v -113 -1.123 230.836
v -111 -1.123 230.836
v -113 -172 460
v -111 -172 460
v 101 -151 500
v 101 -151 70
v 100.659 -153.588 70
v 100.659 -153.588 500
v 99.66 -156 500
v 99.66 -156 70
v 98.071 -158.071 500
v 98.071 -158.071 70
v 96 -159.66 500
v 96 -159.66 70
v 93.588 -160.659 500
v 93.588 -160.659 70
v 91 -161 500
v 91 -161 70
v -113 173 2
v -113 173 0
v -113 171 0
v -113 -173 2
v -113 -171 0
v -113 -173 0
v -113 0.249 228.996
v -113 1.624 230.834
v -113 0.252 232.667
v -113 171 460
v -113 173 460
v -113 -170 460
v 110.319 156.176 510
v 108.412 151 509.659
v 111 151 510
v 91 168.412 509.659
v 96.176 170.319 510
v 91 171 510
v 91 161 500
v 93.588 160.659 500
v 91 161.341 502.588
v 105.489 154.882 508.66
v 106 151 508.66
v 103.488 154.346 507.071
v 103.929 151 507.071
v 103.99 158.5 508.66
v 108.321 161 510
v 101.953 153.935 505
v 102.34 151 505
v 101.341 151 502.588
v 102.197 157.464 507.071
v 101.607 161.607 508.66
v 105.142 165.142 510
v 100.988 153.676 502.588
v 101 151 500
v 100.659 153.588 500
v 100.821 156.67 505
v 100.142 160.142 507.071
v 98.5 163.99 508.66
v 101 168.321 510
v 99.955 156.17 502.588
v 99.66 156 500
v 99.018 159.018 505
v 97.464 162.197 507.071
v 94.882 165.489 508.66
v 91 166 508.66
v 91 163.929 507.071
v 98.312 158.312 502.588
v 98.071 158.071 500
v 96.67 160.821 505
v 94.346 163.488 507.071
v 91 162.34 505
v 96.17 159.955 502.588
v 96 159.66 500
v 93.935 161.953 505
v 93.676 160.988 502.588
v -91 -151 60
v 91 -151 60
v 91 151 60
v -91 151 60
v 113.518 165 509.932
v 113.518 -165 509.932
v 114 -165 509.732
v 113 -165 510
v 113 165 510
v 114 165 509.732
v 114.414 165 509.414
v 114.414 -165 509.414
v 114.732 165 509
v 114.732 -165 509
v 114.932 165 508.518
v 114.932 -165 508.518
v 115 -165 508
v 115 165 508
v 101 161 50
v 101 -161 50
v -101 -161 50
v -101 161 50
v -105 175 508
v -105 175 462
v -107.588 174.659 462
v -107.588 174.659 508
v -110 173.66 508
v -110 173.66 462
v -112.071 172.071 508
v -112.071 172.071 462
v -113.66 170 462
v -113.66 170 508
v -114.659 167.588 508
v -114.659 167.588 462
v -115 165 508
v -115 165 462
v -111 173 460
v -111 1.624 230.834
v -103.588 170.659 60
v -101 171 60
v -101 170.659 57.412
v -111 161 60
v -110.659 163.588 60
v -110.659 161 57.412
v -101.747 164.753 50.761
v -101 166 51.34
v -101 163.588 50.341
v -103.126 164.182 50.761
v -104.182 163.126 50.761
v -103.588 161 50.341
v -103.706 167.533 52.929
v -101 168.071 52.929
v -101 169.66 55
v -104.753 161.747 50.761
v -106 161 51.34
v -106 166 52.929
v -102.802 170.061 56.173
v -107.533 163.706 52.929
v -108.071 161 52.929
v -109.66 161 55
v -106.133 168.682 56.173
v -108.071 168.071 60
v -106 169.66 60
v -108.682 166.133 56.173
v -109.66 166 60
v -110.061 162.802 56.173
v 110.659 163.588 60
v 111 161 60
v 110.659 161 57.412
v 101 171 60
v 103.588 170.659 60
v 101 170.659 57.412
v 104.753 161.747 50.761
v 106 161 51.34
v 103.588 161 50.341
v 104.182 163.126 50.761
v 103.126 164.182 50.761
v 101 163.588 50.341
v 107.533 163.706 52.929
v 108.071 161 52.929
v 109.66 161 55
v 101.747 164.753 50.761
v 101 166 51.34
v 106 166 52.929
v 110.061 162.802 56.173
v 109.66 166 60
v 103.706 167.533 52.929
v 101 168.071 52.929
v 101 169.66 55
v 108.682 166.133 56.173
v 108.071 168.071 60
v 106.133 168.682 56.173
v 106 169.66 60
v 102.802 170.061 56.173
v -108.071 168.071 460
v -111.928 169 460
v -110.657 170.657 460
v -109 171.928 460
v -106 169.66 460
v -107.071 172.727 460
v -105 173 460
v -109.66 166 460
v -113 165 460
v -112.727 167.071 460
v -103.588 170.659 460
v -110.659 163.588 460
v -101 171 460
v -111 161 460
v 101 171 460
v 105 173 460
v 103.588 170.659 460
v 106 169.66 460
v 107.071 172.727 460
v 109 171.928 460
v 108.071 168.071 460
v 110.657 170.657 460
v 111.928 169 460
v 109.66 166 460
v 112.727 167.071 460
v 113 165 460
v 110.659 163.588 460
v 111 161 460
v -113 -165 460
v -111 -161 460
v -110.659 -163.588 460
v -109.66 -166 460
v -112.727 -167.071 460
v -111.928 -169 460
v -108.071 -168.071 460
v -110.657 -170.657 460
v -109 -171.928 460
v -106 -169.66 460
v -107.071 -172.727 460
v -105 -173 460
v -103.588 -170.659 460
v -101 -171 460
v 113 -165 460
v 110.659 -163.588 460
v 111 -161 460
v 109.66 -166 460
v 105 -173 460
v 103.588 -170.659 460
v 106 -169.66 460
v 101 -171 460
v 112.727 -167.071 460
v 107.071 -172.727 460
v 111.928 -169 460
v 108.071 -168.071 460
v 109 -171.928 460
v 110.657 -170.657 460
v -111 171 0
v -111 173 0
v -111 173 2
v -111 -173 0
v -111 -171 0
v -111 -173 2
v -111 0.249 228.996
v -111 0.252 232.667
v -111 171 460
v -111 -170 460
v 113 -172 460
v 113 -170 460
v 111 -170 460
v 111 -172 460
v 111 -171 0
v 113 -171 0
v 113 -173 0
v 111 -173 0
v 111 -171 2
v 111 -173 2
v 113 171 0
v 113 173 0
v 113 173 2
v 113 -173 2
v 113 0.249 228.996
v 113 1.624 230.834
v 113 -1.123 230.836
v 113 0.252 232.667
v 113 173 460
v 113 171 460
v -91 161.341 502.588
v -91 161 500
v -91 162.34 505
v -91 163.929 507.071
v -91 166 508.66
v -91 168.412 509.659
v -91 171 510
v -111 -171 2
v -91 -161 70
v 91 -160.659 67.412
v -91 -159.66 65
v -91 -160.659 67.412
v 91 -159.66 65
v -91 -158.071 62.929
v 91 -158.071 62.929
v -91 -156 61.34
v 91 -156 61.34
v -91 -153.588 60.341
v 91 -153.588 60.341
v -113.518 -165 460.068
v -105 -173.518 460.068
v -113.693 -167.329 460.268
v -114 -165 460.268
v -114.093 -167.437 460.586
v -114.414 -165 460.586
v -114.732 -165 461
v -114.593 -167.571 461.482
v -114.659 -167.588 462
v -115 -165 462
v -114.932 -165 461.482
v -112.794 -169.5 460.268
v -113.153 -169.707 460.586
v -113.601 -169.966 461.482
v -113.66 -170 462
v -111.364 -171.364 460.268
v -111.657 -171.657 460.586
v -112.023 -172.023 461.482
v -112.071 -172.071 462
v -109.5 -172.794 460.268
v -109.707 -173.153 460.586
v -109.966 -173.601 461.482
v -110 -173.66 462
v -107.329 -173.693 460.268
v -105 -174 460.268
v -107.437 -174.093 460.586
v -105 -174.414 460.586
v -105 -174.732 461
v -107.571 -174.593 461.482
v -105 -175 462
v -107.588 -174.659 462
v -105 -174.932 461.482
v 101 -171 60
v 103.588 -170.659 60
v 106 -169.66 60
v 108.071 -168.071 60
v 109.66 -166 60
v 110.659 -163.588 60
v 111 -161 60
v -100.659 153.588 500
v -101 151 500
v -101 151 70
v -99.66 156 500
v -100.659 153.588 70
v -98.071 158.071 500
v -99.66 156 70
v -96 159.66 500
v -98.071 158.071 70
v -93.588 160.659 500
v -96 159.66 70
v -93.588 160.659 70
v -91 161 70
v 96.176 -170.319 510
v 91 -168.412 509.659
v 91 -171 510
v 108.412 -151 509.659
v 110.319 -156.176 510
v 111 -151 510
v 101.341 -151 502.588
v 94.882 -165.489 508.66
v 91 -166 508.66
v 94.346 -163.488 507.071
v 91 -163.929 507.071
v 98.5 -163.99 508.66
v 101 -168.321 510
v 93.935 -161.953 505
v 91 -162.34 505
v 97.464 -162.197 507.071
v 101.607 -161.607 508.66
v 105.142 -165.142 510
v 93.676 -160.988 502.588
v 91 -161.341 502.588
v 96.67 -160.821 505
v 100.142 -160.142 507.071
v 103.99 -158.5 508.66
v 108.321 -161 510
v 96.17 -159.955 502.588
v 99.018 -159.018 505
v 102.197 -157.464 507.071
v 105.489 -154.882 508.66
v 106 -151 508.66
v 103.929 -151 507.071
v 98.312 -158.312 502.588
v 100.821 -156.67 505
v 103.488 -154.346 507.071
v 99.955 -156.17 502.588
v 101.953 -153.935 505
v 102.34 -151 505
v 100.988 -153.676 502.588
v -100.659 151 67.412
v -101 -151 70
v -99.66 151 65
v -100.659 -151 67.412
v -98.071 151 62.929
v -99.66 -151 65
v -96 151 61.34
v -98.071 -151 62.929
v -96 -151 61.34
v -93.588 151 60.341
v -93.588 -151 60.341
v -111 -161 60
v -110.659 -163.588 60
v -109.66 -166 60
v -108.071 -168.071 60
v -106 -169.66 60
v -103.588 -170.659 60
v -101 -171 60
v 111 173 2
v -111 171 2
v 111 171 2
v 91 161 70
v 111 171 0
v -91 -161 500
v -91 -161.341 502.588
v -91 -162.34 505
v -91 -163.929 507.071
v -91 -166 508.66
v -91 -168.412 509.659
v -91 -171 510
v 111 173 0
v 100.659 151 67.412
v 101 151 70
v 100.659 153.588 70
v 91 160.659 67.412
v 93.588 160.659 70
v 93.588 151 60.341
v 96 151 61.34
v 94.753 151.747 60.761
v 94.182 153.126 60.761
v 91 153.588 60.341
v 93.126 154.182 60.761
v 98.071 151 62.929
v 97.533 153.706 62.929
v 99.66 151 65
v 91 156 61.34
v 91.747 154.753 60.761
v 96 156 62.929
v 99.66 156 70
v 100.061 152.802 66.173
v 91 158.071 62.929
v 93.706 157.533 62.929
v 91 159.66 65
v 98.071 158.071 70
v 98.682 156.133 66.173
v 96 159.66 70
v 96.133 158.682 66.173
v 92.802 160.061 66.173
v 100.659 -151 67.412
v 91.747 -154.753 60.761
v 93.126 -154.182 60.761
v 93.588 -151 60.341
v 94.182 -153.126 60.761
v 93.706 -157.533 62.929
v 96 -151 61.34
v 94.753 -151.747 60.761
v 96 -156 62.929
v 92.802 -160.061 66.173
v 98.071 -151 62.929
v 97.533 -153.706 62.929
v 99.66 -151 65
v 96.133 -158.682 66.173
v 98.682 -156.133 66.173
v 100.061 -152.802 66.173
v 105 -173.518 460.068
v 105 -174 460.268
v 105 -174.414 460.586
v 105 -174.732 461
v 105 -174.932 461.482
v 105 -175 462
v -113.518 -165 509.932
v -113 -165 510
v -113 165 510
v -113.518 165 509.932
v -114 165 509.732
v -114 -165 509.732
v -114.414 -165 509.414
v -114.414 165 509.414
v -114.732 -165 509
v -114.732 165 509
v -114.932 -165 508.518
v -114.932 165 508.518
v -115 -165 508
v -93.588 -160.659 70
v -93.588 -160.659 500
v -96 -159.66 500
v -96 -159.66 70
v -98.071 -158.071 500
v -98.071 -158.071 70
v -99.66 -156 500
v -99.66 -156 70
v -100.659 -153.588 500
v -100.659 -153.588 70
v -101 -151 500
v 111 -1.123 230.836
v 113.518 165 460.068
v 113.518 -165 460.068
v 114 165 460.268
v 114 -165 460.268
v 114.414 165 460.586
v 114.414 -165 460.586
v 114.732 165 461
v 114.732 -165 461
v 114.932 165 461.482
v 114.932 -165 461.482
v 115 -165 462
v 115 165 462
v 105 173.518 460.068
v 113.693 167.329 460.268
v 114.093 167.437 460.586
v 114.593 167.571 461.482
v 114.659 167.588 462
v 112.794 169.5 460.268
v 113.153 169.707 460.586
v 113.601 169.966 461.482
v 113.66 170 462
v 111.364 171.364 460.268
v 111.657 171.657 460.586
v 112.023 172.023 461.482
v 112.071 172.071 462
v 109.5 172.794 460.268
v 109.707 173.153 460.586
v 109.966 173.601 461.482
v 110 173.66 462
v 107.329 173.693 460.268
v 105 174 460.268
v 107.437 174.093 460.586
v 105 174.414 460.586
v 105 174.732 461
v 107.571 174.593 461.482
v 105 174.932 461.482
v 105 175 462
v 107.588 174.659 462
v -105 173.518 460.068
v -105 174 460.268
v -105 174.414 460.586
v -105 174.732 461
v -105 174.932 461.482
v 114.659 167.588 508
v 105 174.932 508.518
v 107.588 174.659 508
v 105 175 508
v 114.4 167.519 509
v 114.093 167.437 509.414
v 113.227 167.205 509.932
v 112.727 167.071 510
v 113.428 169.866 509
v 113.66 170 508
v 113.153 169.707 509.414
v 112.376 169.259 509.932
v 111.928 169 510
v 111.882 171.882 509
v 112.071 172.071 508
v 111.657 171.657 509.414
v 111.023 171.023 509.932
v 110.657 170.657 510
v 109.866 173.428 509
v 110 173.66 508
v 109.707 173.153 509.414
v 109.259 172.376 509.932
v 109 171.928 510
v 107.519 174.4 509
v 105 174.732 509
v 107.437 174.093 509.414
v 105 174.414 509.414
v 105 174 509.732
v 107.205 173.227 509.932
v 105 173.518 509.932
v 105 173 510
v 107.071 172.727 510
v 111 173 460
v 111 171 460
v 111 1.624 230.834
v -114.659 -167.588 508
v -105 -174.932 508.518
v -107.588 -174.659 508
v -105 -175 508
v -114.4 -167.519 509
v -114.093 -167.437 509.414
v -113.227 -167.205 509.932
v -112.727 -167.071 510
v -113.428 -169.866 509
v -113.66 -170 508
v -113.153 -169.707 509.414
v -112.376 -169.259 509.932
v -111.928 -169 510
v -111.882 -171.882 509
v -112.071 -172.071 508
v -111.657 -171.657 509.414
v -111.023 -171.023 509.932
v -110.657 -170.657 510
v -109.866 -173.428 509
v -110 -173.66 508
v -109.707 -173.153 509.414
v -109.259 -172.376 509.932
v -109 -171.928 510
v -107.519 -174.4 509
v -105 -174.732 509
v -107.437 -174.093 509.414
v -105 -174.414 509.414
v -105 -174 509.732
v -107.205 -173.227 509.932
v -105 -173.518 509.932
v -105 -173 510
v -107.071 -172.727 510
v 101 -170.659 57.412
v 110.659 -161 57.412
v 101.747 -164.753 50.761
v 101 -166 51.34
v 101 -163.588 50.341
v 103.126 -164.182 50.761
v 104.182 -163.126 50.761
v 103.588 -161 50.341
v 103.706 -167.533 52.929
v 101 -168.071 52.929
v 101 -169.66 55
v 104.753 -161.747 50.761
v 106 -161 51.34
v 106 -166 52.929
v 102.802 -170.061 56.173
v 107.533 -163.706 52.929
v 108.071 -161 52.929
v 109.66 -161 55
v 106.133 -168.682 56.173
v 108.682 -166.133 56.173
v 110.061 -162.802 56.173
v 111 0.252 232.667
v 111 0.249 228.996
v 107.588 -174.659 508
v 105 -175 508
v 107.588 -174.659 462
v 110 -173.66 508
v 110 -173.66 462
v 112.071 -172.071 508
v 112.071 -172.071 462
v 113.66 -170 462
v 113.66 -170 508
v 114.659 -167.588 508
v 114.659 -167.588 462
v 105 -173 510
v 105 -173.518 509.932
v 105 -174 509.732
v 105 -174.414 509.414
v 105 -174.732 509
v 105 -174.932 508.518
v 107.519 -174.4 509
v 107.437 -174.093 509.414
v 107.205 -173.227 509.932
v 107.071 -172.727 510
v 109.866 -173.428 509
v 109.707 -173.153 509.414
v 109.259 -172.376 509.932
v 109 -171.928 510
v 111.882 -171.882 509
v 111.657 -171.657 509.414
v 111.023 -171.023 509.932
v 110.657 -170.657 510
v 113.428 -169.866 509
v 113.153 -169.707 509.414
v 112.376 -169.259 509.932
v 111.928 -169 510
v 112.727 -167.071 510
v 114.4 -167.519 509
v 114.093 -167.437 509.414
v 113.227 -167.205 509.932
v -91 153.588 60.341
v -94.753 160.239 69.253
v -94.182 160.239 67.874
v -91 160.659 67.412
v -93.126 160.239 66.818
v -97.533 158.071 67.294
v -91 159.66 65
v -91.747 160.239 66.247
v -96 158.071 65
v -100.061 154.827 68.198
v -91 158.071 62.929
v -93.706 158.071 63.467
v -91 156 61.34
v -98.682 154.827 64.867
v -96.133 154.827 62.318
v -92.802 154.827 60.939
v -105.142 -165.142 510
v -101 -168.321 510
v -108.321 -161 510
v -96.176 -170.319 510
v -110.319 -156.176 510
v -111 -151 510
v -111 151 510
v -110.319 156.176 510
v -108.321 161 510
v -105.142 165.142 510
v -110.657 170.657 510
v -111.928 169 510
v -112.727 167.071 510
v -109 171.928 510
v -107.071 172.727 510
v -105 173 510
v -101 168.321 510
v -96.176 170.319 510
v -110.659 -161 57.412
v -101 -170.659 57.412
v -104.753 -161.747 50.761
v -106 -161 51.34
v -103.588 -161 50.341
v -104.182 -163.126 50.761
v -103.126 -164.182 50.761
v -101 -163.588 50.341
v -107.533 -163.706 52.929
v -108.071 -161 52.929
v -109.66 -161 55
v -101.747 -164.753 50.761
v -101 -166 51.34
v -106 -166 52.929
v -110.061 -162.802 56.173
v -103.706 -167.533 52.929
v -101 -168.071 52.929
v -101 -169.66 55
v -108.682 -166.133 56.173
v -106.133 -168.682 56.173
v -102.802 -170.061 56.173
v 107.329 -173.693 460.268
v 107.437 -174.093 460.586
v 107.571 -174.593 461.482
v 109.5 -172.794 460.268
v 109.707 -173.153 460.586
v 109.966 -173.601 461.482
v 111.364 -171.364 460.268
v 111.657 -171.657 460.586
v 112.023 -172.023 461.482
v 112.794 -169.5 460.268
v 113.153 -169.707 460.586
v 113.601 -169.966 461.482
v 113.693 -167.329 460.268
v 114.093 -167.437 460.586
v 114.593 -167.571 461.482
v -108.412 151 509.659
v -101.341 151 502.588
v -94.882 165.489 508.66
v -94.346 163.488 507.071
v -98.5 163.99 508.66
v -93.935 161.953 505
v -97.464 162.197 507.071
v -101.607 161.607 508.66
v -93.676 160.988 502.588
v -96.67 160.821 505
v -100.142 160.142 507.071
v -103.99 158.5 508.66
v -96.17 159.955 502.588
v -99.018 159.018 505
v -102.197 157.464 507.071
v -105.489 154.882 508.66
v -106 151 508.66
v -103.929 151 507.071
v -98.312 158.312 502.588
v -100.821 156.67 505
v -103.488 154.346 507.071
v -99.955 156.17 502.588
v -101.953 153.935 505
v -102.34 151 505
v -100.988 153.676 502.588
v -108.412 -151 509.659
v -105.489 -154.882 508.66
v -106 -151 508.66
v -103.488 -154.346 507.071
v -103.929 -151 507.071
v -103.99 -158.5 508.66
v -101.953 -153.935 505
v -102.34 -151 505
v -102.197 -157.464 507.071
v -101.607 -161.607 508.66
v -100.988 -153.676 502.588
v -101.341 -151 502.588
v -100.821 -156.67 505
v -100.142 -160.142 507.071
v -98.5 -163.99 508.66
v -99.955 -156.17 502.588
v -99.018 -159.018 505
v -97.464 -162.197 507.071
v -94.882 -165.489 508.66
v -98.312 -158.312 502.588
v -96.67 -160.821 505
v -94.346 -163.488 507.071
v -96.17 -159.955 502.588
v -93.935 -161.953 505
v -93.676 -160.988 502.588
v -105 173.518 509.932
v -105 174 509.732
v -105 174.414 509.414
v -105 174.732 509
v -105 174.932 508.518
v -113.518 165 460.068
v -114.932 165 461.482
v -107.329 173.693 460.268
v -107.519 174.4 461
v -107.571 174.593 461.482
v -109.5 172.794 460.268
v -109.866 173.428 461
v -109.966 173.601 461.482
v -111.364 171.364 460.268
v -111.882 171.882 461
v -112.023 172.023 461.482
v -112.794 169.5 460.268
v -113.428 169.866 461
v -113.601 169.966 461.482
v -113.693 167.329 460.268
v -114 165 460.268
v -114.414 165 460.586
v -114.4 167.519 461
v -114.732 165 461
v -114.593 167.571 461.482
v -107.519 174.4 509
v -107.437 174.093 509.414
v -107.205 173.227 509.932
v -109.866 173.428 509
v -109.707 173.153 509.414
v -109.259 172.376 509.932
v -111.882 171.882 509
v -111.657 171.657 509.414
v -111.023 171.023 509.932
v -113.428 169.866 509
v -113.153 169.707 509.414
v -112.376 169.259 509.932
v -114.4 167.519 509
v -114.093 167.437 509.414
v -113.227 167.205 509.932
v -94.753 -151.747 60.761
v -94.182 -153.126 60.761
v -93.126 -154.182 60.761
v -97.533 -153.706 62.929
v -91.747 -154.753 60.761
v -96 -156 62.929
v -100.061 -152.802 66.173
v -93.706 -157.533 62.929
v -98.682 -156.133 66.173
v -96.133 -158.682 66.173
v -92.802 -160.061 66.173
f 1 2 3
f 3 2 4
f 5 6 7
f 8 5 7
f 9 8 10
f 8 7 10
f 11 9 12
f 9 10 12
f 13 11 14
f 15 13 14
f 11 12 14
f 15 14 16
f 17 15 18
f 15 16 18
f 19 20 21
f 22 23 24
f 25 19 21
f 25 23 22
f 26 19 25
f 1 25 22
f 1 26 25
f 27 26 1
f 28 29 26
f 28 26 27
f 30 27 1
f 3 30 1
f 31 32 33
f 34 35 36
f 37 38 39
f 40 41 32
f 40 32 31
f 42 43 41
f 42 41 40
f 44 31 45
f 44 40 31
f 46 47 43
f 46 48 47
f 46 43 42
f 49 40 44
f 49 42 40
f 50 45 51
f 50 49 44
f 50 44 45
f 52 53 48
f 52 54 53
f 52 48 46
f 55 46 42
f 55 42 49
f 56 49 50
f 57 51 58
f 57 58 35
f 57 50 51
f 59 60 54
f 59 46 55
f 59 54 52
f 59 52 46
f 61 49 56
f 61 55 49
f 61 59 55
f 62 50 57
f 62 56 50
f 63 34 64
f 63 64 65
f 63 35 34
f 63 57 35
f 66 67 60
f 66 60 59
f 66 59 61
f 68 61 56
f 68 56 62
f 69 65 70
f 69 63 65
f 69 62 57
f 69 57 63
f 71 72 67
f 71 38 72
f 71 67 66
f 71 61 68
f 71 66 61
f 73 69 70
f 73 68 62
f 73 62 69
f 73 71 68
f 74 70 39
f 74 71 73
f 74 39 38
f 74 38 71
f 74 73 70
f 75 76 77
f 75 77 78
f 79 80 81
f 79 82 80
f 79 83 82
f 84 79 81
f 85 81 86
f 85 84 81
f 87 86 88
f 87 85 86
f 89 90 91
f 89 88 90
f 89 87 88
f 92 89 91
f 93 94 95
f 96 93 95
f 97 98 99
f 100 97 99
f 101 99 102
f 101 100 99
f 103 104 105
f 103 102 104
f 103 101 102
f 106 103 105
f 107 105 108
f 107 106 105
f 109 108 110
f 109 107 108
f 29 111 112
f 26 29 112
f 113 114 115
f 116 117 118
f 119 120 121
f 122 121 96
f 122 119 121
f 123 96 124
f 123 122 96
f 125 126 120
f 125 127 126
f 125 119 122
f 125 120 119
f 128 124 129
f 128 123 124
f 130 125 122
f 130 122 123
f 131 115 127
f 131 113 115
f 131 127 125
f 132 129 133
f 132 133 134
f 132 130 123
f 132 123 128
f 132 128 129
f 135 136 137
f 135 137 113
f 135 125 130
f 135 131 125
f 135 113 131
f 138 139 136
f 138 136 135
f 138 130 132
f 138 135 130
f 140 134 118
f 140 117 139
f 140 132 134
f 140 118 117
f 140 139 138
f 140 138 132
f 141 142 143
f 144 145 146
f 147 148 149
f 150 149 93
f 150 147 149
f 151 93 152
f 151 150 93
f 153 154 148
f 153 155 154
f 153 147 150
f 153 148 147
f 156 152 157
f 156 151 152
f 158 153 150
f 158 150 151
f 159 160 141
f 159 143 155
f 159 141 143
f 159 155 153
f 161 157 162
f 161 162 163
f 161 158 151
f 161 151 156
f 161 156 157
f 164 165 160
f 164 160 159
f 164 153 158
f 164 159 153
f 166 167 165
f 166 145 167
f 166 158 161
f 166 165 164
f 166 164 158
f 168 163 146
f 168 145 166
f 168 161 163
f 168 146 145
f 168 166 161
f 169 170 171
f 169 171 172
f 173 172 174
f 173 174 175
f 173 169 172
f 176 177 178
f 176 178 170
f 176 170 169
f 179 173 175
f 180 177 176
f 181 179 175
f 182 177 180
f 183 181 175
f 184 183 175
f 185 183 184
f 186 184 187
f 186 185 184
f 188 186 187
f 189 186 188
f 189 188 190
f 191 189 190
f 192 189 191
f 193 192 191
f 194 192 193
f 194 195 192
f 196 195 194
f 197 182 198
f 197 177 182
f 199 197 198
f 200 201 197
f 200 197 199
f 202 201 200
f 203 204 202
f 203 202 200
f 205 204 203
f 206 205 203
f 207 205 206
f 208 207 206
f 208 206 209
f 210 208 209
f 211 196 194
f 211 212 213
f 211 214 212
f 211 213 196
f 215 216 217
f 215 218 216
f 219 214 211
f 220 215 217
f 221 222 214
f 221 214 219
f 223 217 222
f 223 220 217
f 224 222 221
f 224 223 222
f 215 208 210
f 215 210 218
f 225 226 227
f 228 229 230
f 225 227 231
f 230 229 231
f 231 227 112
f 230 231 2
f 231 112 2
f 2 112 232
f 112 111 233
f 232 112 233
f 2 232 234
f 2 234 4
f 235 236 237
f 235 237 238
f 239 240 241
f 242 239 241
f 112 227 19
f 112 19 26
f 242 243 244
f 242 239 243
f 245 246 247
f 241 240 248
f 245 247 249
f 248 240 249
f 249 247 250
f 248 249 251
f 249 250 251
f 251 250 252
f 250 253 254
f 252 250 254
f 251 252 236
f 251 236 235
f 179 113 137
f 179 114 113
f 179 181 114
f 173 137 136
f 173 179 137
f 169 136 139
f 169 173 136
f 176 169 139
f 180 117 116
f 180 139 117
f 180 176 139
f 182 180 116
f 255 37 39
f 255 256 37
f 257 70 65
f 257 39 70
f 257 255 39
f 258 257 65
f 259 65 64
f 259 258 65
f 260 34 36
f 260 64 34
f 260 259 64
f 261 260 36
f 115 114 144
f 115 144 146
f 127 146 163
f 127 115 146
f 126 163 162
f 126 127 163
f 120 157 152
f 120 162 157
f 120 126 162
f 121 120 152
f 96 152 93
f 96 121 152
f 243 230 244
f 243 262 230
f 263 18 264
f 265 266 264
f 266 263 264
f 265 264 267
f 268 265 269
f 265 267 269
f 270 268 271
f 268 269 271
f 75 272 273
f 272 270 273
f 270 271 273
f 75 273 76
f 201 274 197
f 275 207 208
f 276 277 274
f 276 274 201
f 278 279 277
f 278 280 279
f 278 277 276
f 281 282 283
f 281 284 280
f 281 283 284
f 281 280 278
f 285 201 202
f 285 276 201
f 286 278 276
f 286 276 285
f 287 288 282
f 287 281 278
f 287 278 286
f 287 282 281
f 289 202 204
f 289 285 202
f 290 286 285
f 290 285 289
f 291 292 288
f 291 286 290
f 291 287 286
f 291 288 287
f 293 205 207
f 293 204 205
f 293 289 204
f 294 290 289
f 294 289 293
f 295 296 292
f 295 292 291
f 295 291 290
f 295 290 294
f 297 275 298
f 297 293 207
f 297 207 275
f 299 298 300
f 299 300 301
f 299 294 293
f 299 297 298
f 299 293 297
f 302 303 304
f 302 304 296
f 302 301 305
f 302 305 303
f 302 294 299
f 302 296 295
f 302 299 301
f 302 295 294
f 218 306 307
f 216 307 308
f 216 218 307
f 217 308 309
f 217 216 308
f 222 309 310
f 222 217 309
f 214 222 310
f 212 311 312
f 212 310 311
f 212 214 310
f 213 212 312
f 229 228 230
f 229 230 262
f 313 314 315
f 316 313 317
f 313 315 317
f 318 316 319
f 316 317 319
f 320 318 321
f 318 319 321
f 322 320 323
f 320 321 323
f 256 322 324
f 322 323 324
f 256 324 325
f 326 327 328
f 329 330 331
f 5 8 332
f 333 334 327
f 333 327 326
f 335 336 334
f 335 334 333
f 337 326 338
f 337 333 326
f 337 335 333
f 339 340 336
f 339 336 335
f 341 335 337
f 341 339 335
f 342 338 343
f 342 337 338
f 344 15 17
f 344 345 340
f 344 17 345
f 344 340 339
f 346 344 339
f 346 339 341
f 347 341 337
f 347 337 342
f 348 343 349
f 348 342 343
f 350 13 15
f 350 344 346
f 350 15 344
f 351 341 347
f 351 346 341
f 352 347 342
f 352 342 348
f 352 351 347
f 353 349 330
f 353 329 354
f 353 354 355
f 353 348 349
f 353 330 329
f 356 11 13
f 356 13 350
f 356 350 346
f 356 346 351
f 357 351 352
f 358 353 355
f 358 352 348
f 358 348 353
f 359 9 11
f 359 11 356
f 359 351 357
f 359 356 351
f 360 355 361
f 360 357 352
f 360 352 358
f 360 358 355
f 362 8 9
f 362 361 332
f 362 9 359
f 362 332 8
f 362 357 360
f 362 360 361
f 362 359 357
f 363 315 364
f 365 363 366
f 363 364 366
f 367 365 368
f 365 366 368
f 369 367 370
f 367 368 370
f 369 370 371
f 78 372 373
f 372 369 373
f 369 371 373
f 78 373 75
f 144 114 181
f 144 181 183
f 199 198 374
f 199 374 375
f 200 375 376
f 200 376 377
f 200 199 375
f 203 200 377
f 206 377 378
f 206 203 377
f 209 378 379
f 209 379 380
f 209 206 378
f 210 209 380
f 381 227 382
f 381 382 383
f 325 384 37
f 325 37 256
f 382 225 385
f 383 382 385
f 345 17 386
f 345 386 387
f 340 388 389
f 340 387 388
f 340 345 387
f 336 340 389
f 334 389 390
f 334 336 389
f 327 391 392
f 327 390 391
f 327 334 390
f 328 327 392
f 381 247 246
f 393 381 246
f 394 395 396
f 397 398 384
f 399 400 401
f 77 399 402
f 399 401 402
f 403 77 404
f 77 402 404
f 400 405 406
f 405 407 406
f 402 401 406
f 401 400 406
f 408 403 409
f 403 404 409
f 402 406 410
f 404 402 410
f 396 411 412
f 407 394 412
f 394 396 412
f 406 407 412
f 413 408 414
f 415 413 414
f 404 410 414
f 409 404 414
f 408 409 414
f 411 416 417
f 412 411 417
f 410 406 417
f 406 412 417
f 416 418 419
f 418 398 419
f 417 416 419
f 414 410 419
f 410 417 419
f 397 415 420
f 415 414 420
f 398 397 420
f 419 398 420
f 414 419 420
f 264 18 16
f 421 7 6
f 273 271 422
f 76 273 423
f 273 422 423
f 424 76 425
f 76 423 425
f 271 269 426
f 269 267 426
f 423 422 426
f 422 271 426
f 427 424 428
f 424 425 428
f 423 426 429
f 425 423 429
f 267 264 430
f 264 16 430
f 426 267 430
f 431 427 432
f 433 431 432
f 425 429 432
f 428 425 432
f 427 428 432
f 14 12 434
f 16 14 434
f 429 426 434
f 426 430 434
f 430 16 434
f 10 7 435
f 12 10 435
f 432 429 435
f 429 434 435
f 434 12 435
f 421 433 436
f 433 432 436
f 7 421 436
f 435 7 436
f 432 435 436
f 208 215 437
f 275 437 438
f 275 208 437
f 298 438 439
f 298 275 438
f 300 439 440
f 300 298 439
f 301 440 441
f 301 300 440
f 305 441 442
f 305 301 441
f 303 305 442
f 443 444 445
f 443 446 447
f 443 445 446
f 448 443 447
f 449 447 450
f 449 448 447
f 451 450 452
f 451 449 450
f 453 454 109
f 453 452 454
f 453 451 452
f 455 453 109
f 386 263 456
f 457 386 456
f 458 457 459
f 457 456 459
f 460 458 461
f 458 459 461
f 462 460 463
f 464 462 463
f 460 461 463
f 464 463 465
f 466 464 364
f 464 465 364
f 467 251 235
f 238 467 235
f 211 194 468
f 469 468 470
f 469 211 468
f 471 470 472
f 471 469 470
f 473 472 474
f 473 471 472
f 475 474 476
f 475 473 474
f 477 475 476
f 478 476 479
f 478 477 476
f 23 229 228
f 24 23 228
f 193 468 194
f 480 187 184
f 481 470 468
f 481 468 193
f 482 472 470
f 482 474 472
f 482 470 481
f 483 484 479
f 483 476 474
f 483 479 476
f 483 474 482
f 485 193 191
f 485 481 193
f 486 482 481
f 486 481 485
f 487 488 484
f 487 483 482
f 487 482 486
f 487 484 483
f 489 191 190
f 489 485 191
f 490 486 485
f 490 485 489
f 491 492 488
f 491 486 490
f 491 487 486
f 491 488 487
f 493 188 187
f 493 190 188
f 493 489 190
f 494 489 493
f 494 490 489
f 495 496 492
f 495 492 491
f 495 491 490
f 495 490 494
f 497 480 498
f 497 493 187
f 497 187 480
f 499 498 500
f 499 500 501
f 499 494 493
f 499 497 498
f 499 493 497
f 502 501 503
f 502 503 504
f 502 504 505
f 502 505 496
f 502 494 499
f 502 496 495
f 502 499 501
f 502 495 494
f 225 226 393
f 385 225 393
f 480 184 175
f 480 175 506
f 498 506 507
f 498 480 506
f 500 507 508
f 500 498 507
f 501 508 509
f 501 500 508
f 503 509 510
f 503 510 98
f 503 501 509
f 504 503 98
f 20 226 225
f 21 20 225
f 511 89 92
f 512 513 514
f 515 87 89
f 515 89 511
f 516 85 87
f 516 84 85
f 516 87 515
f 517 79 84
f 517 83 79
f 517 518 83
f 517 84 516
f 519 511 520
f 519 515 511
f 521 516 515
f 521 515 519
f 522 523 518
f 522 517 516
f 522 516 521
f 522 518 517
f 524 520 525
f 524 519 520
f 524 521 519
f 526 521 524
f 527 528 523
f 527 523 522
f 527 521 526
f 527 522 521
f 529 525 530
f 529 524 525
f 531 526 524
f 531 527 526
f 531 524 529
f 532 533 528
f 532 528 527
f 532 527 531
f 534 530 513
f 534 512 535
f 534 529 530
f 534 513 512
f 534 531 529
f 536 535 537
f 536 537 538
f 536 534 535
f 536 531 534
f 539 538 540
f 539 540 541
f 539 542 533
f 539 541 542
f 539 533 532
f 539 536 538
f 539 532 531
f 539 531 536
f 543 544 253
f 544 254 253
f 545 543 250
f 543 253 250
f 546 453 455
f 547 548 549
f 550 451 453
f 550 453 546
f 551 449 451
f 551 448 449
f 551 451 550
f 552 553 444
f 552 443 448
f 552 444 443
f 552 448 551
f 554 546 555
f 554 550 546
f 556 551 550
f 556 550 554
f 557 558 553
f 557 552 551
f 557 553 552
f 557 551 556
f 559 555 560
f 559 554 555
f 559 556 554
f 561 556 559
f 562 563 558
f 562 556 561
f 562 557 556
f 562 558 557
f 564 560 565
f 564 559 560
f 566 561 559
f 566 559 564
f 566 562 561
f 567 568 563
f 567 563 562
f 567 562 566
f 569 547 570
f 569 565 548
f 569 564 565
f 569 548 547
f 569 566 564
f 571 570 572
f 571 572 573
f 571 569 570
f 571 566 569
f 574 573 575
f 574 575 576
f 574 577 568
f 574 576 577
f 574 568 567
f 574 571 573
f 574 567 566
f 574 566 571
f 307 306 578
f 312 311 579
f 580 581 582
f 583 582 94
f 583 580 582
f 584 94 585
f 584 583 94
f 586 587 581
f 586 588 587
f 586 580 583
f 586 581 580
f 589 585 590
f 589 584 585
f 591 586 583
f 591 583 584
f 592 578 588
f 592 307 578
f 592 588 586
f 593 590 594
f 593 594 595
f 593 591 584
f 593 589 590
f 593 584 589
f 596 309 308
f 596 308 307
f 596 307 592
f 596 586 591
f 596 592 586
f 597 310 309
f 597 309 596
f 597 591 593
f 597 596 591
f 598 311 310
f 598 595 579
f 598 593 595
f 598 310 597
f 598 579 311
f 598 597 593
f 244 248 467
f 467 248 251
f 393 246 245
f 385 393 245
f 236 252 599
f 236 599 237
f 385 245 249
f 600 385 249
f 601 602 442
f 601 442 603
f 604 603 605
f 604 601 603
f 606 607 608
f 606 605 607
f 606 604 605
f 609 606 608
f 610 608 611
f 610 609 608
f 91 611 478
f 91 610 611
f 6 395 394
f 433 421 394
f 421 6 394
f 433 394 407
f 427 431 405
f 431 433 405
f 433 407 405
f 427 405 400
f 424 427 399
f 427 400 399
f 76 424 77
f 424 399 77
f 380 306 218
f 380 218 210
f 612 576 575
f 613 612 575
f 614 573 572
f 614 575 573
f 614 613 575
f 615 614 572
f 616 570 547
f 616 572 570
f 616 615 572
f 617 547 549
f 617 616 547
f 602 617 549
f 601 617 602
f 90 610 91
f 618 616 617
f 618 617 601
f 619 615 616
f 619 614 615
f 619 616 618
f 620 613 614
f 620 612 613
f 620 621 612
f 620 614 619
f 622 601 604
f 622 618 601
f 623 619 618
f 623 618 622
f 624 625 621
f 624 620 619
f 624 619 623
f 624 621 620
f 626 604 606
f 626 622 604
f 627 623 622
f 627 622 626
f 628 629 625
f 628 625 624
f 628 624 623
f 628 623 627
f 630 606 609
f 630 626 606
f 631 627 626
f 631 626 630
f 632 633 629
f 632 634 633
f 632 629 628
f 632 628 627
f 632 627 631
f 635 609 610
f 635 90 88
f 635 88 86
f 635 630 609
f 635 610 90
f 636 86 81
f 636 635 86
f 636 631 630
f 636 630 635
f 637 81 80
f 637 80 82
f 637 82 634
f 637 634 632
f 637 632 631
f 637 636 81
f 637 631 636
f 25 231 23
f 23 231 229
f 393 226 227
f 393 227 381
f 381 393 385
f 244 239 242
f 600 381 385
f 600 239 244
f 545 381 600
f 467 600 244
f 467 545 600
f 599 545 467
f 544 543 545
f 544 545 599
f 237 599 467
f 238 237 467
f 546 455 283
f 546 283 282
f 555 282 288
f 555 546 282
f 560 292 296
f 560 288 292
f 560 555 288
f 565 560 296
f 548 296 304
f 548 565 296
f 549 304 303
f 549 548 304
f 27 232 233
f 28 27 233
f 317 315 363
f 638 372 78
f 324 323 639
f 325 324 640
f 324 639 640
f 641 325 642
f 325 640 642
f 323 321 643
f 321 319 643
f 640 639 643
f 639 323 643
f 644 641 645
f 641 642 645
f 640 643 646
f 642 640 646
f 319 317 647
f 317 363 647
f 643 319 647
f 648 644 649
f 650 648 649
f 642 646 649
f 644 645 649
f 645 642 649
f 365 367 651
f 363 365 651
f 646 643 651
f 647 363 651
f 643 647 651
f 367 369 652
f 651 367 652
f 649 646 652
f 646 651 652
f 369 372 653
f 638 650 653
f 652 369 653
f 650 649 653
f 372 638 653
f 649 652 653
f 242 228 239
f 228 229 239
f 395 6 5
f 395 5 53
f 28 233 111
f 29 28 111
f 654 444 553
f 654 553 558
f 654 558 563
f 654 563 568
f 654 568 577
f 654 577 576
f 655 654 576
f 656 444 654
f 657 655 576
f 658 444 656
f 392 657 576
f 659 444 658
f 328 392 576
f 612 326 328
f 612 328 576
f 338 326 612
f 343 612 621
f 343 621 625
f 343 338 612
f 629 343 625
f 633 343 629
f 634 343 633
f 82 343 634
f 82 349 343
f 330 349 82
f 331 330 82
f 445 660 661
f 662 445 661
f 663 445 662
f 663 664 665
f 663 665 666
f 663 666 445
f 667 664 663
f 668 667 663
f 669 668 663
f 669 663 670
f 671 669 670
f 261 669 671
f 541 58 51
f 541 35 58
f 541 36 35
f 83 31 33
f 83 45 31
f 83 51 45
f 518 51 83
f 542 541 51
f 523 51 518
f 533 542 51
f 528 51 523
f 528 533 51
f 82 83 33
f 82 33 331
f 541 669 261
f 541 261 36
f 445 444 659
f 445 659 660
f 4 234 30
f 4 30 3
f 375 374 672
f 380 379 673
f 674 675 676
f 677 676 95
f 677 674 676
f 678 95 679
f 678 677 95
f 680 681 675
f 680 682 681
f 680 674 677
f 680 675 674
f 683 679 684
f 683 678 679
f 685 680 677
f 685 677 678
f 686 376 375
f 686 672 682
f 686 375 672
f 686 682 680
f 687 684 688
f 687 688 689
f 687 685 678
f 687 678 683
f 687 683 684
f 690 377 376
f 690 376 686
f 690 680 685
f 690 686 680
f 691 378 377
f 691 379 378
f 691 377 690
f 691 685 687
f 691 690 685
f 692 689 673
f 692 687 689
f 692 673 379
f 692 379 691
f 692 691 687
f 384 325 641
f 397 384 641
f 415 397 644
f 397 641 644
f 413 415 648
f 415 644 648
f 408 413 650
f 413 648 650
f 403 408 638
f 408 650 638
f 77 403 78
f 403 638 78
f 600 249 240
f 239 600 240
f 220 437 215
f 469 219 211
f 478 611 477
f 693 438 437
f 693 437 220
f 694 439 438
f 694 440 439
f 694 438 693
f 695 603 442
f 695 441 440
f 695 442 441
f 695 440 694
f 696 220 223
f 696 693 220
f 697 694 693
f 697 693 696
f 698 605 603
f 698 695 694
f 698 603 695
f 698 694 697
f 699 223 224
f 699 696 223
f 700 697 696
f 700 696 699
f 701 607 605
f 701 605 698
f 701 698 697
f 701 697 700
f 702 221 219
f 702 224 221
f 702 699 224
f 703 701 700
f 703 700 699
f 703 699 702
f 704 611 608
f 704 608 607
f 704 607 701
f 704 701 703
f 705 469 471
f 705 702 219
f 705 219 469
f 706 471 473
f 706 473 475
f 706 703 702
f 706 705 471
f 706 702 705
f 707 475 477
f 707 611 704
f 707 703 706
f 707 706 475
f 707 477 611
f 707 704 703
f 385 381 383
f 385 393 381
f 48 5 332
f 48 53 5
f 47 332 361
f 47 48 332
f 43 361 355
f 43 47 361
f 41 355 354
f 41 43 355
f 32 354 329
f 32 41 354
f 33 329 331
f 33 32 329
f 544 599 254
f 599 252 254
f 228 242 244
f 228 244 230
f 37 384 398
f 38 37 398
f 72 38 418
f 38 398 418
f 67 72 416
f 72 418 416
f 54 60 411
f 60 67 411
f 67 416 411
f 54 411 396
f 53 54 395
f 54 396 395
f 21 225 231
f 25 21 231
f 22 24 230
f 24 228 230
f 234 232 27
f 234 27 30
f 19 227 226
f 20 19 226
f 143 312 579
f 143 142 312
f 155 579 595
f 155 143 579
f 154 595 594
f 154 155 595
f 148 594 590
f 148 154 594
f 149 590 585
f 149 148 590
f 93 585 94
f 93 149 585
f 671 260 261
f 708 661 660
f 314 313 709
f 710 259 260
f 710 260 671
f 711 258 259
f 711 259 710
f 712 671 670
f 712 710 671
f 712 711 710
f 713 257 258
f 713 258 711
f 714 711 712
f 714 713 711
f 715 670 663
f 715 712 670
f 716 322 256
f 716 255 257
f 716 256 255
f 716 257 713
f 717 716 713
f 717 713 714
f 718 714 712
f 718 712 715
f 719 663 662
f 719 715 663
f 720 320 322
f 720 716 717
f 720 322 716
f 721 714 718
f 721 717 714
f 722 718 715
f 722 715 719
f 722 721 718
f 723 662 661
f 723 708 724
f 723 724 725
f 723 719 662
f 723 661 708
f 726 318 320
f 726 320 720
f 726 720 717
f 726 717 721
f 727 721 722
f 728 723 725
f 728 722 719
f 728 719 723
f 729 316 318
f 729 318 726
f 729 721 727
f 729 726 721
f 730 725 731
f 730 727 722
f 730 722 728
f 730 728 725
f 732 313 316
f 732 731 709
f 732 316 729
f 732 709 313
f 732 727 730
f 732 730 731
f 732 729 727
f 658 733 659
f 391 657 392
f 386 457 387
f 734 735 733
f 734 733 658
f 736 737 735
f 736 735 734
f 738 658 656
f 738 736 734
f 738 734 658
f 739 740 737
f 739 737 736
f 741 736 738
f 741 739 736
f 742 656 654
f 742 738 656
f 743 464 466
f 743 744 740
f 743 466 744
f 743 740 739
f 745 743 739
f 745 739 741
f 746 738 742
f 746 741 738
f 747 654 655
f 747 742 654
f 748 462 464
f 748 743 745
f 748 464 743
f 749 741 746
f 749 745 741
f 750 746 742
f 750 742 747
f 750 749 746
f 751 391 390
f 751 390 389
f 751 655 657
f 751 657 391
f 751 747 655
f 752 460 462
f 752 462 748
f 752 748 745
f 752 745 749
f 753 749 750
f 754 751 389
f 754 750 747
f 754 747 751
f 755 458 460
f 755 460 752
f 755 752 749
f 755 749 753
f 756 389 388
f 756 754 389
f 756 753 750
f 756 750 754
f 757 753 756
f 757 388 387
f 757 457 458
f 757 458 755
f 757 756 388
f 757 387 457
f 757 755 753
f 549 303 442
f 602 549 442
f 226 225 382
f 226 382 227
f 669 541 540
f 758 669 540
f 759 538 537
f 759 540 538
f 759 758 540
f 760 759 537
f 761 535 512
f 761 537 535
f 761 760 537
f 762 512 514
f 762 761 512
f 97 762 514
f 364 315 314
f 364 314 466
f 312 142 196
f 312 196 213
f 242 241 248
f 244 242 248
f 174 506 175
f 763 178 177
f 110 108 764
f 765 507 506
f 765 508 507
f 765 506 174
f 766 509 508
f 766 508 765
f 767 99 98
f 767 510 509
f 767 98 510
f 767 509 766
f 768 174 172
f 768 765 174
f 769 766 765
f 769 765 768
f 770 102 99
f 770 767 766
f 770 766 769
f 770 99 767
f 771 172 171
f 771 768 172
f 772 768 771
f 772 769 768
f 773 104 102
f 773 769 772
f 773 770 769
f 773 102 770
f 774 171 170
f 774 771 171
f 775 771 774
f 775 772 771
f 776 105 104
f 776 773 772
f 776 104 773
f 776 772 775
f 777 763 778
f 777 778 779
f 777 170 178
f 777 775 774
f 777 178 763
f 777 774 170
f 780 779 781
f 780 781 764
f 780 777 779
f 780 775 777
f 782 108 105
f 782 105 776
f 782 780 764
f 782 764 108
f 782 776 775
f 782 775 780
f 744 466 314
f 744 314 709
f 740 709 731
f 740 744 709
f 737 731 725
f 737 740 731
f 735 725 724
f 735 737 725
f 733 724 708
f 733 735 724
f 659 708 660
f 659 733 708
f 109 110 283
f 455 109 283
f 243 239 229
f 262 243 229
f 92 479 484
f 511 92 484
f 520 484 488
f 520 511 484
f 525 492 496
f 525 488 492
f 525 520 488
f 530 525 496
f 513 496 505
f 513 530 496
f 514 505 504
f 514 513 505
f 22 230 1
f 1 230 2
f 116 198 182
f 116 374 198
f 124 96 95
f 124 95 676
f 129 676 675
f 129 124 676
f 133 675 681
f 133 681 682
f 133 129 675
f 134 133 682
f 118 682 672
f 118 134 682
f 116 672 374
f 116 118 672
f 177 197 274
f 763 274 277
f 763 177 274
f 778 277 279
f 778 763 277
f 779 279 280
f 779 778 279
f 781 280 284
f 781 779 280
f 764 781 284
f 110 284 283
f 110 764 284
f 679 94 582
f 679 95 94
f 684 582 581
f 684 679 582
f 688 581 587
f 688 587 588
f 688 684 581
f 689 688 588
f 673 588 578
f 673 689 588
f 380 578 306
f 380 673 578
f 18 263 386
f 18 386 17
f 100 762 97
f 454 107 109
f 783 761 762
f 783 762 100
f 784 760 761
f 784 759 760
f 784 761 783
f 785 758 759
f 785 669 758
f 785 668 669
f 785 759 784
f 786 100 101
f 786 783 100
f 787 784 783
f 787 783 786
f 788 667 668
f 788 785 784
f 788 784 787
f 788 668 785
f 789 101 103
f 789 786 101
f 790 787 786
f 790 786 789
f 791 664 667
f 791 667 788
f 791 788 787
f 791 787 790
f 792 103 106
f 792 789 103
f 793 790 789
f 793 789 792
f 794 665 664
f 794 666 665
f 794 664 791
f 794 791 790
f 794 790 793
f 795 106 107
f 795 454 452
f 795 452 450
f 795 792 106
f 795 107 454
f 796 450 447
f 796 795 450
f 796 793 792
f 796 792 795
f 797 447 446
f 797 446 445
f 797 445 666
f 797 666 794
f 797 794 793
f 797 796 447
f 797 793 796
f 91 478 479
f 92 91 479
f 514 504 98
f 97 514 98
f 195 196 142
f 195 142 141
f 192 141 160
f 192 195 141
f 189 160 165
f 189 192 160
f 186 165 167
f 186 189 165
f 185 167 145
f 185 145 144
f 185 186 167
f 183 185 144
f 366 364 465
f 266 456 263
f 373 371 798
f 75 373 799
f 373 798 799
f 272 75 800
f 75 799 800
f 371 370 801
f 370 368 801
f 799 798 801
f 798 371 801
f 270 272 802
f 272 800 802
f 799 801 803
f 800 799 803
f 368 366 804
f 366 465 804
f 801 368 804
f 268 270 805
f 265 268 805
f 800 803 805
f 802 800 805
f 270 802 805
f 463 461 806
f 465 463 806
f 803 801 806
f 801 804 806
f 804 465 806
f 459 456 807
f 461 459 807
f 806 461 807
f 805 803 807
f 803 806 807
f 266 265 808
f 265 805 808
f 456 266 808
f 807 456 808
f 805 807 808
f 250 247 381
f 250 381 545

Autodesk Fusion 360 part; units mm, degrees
sketch "Sketch1" plane through (0, 0, 0) normal (0, 0, 1) x (1, 0, 0)
  line L0 (-115, -175) -> (115, -175)
  line L1 (115, -175) -> (115, 175)
  line L2 (115, 175) -> (-115, 175)
  line L3 (-115, 175) -> (-115, -175)
  line L4 (-115, -175) -> (115, 175) construction
  line L5 (115, -175) -> (-115, 175) construction
  dimension "d1" = 350
  dimension "d2" = 230
extrude "Extrude1" add sketch "Sketch1" along normal blind 510 makes body 1
sketch "Sketch2" plane through (0, 0, 0) normal (0, 0, -1) x (1, 0, 0)
  line L0 (-115, 175) -> (-115, -175)
  line L1 (-115, -175) -> (115, -175)
  line L2 (115, -175) -> (115, 175)
  line L3 (115, 175) -> (-115, 175)
  line L4 (-111, -171) -> (111, -171)
  line L5 (111, -171) -> (111, 171)
  line L6 (111, 171) -> (-111, 171)
  line L7 (-111, 171) -> (-111, -171)
  dimension "d5" = -4
extrude "Extrude2" cut sketch "Sketch2" against normal blind 460 bodies 1
sketch "Sketch3" plane through (0, -171, 0) normal (0, -1, 0) x (1, 0, 0)
  line L0 (-111, 0) -> (111, 0)
  line L1 (111, 0) -> (111, 460)
  line L2 (111, 460) -> (-111, 460)
  line L3 (-111, 460) -> (-111, 0)
  line L4 (-111, 0) -> (111, 0)
  line L5 (111, 0) -> (111, 50)
  line L6 (111, 50) -> (-111, 50)
  line L7 (-111, 50) -> (-111, 0)
  dimension "d8" = 50
extrude "Extrude3" cut sketch "Sketch3" against normal up to surface (342 mm away) contours L0 L1 L3 L4 L5 L6 L7 bodies 1
sketch "Sketch4" plane through (0, 0, 510) normal (0, 0, 1) x (-1, 0, 0)
  line L0 (115, -175) -> (115, 175)
  line L1 (115, 175) -> (-115, 175)
  line L2 (-115, 175) -> (-115, -175)
  line L3 (-115, -175) -> (115, -175)
  line L4 (101, 161) -> (-101, 161)
  line L5 (-101, 161) -> (-101, -161)
  line L6 (-101, -161) -> (101, -161)
  line L7 (101, -161) -> (101, 161)
  dimension "d11" = -14
extrude "Extrude4" cut sketch "Sketch4" against normal blind 450 contours L4 L5 L6 L7 bodies 1
sketch "Sketch7" plane through (0, 0, 0) normal (0, 0, 1) x (1, 0, 0)
  line L0 (-111, 171) -> (111, 171)
  line L1 (111, 171) -> (111, -171)
  line L2 (111, -171) -> (-111, -171)
  line L3 (-111, -171) -> (-111, 171)
  line L4 (111, 171) -> (-111, 171)
  line L5 (-111, 171) -> (-111, 173)
  line L6 (-111, 173) -> (111, 173)
  line L7 (111, 173) -> (111, 171)
  line L8 (-111, -171) -> (111, -171)
  line L9 (111, -171) -> (111, -173)
  line L10 (111, -173) -> (-111, -173)
  line L11 (-111, -173) -> (-111, -171)
  dimension "d18" = 2
  dimension "d19" = 2
extrude "Extrude7" add sketch "Sketch7" along normal blind 2 separate body contours L0 L4 L5 L6 L7 | L2 L8 L9 L10 L11 makes body 2 at (-37, 171, 0.6667) makes body 3 at (-37, -171.6667, 0)
sketch "Sketch8" plane through (-111, 0, 0) normal (-1, 0, 0) x (0, -1, 0)
  line L0 (-173, 0) -> (-171, 0)
  line L1 (-171, 0) -> (-171, 2)
  line L2 (-171, 2) -> (-173, 2)
  line L3 (-173, 2) -> (-173, 0)
  line L4 (-173, 2) -> (170, 460)
  line L5 (-171, 0) -> (172, 460)
  line L6 (170, 460) -> (172, 460)
  line L7 (173, 2) -> (-171, 460)
  line L8 (-171, 460) -> (-173, 460)
  line L9 (-173, 460) -> (171, 0)
  line L10 (171, 0) -> (173, 0)
  line L11 (173, 0) -> (173, 2)
  line L12 (-173, 2) -> (-173, 0)
  dimension "d22" = 2
extrude "Extrude8" add sketch "Sketch8" along normal blind 2 separate body makes body 4
pattern_linear "R-Pattern1" count 2 spacing 224 along (1, 0, 0) of bodies 4 makes body 5
fillet "Fillet2" radius 10 5 faces at (101, -53.6667, 360) (-33.6667, -161, 210) (33.6667, -53.6667, 60) (-101, 53.6667, 360) (33.6667, 161, 210) on bodies 1
fillet "Fillet4" radius 10 4 edges at (-115, -175, 485) (115, -175, 485) (115, 175, 485) (-115, 175, 485) on bodies 1
fillet "Fillet5" radius 10 4 edges at (111, -171, 255) (111, 171, 255) (-111, -171, 255) (-111, 171, 255) 1 faces at (37, -57, 50) on bodies 1
fillet "Fillet6" radius 2 8 faces at (35, 175, 476.6667) (-114.8193, 166.8925, 476.6667) (-115, 55, 476.6667) (-114.8193, -166.8925, 476.6667) (-35, -175, 476.6667) (114.7181, -167.3576, 476.6667) (115, -55, 476.6667) (114.7181, 167.3576, 476.6667) on bodies 1
